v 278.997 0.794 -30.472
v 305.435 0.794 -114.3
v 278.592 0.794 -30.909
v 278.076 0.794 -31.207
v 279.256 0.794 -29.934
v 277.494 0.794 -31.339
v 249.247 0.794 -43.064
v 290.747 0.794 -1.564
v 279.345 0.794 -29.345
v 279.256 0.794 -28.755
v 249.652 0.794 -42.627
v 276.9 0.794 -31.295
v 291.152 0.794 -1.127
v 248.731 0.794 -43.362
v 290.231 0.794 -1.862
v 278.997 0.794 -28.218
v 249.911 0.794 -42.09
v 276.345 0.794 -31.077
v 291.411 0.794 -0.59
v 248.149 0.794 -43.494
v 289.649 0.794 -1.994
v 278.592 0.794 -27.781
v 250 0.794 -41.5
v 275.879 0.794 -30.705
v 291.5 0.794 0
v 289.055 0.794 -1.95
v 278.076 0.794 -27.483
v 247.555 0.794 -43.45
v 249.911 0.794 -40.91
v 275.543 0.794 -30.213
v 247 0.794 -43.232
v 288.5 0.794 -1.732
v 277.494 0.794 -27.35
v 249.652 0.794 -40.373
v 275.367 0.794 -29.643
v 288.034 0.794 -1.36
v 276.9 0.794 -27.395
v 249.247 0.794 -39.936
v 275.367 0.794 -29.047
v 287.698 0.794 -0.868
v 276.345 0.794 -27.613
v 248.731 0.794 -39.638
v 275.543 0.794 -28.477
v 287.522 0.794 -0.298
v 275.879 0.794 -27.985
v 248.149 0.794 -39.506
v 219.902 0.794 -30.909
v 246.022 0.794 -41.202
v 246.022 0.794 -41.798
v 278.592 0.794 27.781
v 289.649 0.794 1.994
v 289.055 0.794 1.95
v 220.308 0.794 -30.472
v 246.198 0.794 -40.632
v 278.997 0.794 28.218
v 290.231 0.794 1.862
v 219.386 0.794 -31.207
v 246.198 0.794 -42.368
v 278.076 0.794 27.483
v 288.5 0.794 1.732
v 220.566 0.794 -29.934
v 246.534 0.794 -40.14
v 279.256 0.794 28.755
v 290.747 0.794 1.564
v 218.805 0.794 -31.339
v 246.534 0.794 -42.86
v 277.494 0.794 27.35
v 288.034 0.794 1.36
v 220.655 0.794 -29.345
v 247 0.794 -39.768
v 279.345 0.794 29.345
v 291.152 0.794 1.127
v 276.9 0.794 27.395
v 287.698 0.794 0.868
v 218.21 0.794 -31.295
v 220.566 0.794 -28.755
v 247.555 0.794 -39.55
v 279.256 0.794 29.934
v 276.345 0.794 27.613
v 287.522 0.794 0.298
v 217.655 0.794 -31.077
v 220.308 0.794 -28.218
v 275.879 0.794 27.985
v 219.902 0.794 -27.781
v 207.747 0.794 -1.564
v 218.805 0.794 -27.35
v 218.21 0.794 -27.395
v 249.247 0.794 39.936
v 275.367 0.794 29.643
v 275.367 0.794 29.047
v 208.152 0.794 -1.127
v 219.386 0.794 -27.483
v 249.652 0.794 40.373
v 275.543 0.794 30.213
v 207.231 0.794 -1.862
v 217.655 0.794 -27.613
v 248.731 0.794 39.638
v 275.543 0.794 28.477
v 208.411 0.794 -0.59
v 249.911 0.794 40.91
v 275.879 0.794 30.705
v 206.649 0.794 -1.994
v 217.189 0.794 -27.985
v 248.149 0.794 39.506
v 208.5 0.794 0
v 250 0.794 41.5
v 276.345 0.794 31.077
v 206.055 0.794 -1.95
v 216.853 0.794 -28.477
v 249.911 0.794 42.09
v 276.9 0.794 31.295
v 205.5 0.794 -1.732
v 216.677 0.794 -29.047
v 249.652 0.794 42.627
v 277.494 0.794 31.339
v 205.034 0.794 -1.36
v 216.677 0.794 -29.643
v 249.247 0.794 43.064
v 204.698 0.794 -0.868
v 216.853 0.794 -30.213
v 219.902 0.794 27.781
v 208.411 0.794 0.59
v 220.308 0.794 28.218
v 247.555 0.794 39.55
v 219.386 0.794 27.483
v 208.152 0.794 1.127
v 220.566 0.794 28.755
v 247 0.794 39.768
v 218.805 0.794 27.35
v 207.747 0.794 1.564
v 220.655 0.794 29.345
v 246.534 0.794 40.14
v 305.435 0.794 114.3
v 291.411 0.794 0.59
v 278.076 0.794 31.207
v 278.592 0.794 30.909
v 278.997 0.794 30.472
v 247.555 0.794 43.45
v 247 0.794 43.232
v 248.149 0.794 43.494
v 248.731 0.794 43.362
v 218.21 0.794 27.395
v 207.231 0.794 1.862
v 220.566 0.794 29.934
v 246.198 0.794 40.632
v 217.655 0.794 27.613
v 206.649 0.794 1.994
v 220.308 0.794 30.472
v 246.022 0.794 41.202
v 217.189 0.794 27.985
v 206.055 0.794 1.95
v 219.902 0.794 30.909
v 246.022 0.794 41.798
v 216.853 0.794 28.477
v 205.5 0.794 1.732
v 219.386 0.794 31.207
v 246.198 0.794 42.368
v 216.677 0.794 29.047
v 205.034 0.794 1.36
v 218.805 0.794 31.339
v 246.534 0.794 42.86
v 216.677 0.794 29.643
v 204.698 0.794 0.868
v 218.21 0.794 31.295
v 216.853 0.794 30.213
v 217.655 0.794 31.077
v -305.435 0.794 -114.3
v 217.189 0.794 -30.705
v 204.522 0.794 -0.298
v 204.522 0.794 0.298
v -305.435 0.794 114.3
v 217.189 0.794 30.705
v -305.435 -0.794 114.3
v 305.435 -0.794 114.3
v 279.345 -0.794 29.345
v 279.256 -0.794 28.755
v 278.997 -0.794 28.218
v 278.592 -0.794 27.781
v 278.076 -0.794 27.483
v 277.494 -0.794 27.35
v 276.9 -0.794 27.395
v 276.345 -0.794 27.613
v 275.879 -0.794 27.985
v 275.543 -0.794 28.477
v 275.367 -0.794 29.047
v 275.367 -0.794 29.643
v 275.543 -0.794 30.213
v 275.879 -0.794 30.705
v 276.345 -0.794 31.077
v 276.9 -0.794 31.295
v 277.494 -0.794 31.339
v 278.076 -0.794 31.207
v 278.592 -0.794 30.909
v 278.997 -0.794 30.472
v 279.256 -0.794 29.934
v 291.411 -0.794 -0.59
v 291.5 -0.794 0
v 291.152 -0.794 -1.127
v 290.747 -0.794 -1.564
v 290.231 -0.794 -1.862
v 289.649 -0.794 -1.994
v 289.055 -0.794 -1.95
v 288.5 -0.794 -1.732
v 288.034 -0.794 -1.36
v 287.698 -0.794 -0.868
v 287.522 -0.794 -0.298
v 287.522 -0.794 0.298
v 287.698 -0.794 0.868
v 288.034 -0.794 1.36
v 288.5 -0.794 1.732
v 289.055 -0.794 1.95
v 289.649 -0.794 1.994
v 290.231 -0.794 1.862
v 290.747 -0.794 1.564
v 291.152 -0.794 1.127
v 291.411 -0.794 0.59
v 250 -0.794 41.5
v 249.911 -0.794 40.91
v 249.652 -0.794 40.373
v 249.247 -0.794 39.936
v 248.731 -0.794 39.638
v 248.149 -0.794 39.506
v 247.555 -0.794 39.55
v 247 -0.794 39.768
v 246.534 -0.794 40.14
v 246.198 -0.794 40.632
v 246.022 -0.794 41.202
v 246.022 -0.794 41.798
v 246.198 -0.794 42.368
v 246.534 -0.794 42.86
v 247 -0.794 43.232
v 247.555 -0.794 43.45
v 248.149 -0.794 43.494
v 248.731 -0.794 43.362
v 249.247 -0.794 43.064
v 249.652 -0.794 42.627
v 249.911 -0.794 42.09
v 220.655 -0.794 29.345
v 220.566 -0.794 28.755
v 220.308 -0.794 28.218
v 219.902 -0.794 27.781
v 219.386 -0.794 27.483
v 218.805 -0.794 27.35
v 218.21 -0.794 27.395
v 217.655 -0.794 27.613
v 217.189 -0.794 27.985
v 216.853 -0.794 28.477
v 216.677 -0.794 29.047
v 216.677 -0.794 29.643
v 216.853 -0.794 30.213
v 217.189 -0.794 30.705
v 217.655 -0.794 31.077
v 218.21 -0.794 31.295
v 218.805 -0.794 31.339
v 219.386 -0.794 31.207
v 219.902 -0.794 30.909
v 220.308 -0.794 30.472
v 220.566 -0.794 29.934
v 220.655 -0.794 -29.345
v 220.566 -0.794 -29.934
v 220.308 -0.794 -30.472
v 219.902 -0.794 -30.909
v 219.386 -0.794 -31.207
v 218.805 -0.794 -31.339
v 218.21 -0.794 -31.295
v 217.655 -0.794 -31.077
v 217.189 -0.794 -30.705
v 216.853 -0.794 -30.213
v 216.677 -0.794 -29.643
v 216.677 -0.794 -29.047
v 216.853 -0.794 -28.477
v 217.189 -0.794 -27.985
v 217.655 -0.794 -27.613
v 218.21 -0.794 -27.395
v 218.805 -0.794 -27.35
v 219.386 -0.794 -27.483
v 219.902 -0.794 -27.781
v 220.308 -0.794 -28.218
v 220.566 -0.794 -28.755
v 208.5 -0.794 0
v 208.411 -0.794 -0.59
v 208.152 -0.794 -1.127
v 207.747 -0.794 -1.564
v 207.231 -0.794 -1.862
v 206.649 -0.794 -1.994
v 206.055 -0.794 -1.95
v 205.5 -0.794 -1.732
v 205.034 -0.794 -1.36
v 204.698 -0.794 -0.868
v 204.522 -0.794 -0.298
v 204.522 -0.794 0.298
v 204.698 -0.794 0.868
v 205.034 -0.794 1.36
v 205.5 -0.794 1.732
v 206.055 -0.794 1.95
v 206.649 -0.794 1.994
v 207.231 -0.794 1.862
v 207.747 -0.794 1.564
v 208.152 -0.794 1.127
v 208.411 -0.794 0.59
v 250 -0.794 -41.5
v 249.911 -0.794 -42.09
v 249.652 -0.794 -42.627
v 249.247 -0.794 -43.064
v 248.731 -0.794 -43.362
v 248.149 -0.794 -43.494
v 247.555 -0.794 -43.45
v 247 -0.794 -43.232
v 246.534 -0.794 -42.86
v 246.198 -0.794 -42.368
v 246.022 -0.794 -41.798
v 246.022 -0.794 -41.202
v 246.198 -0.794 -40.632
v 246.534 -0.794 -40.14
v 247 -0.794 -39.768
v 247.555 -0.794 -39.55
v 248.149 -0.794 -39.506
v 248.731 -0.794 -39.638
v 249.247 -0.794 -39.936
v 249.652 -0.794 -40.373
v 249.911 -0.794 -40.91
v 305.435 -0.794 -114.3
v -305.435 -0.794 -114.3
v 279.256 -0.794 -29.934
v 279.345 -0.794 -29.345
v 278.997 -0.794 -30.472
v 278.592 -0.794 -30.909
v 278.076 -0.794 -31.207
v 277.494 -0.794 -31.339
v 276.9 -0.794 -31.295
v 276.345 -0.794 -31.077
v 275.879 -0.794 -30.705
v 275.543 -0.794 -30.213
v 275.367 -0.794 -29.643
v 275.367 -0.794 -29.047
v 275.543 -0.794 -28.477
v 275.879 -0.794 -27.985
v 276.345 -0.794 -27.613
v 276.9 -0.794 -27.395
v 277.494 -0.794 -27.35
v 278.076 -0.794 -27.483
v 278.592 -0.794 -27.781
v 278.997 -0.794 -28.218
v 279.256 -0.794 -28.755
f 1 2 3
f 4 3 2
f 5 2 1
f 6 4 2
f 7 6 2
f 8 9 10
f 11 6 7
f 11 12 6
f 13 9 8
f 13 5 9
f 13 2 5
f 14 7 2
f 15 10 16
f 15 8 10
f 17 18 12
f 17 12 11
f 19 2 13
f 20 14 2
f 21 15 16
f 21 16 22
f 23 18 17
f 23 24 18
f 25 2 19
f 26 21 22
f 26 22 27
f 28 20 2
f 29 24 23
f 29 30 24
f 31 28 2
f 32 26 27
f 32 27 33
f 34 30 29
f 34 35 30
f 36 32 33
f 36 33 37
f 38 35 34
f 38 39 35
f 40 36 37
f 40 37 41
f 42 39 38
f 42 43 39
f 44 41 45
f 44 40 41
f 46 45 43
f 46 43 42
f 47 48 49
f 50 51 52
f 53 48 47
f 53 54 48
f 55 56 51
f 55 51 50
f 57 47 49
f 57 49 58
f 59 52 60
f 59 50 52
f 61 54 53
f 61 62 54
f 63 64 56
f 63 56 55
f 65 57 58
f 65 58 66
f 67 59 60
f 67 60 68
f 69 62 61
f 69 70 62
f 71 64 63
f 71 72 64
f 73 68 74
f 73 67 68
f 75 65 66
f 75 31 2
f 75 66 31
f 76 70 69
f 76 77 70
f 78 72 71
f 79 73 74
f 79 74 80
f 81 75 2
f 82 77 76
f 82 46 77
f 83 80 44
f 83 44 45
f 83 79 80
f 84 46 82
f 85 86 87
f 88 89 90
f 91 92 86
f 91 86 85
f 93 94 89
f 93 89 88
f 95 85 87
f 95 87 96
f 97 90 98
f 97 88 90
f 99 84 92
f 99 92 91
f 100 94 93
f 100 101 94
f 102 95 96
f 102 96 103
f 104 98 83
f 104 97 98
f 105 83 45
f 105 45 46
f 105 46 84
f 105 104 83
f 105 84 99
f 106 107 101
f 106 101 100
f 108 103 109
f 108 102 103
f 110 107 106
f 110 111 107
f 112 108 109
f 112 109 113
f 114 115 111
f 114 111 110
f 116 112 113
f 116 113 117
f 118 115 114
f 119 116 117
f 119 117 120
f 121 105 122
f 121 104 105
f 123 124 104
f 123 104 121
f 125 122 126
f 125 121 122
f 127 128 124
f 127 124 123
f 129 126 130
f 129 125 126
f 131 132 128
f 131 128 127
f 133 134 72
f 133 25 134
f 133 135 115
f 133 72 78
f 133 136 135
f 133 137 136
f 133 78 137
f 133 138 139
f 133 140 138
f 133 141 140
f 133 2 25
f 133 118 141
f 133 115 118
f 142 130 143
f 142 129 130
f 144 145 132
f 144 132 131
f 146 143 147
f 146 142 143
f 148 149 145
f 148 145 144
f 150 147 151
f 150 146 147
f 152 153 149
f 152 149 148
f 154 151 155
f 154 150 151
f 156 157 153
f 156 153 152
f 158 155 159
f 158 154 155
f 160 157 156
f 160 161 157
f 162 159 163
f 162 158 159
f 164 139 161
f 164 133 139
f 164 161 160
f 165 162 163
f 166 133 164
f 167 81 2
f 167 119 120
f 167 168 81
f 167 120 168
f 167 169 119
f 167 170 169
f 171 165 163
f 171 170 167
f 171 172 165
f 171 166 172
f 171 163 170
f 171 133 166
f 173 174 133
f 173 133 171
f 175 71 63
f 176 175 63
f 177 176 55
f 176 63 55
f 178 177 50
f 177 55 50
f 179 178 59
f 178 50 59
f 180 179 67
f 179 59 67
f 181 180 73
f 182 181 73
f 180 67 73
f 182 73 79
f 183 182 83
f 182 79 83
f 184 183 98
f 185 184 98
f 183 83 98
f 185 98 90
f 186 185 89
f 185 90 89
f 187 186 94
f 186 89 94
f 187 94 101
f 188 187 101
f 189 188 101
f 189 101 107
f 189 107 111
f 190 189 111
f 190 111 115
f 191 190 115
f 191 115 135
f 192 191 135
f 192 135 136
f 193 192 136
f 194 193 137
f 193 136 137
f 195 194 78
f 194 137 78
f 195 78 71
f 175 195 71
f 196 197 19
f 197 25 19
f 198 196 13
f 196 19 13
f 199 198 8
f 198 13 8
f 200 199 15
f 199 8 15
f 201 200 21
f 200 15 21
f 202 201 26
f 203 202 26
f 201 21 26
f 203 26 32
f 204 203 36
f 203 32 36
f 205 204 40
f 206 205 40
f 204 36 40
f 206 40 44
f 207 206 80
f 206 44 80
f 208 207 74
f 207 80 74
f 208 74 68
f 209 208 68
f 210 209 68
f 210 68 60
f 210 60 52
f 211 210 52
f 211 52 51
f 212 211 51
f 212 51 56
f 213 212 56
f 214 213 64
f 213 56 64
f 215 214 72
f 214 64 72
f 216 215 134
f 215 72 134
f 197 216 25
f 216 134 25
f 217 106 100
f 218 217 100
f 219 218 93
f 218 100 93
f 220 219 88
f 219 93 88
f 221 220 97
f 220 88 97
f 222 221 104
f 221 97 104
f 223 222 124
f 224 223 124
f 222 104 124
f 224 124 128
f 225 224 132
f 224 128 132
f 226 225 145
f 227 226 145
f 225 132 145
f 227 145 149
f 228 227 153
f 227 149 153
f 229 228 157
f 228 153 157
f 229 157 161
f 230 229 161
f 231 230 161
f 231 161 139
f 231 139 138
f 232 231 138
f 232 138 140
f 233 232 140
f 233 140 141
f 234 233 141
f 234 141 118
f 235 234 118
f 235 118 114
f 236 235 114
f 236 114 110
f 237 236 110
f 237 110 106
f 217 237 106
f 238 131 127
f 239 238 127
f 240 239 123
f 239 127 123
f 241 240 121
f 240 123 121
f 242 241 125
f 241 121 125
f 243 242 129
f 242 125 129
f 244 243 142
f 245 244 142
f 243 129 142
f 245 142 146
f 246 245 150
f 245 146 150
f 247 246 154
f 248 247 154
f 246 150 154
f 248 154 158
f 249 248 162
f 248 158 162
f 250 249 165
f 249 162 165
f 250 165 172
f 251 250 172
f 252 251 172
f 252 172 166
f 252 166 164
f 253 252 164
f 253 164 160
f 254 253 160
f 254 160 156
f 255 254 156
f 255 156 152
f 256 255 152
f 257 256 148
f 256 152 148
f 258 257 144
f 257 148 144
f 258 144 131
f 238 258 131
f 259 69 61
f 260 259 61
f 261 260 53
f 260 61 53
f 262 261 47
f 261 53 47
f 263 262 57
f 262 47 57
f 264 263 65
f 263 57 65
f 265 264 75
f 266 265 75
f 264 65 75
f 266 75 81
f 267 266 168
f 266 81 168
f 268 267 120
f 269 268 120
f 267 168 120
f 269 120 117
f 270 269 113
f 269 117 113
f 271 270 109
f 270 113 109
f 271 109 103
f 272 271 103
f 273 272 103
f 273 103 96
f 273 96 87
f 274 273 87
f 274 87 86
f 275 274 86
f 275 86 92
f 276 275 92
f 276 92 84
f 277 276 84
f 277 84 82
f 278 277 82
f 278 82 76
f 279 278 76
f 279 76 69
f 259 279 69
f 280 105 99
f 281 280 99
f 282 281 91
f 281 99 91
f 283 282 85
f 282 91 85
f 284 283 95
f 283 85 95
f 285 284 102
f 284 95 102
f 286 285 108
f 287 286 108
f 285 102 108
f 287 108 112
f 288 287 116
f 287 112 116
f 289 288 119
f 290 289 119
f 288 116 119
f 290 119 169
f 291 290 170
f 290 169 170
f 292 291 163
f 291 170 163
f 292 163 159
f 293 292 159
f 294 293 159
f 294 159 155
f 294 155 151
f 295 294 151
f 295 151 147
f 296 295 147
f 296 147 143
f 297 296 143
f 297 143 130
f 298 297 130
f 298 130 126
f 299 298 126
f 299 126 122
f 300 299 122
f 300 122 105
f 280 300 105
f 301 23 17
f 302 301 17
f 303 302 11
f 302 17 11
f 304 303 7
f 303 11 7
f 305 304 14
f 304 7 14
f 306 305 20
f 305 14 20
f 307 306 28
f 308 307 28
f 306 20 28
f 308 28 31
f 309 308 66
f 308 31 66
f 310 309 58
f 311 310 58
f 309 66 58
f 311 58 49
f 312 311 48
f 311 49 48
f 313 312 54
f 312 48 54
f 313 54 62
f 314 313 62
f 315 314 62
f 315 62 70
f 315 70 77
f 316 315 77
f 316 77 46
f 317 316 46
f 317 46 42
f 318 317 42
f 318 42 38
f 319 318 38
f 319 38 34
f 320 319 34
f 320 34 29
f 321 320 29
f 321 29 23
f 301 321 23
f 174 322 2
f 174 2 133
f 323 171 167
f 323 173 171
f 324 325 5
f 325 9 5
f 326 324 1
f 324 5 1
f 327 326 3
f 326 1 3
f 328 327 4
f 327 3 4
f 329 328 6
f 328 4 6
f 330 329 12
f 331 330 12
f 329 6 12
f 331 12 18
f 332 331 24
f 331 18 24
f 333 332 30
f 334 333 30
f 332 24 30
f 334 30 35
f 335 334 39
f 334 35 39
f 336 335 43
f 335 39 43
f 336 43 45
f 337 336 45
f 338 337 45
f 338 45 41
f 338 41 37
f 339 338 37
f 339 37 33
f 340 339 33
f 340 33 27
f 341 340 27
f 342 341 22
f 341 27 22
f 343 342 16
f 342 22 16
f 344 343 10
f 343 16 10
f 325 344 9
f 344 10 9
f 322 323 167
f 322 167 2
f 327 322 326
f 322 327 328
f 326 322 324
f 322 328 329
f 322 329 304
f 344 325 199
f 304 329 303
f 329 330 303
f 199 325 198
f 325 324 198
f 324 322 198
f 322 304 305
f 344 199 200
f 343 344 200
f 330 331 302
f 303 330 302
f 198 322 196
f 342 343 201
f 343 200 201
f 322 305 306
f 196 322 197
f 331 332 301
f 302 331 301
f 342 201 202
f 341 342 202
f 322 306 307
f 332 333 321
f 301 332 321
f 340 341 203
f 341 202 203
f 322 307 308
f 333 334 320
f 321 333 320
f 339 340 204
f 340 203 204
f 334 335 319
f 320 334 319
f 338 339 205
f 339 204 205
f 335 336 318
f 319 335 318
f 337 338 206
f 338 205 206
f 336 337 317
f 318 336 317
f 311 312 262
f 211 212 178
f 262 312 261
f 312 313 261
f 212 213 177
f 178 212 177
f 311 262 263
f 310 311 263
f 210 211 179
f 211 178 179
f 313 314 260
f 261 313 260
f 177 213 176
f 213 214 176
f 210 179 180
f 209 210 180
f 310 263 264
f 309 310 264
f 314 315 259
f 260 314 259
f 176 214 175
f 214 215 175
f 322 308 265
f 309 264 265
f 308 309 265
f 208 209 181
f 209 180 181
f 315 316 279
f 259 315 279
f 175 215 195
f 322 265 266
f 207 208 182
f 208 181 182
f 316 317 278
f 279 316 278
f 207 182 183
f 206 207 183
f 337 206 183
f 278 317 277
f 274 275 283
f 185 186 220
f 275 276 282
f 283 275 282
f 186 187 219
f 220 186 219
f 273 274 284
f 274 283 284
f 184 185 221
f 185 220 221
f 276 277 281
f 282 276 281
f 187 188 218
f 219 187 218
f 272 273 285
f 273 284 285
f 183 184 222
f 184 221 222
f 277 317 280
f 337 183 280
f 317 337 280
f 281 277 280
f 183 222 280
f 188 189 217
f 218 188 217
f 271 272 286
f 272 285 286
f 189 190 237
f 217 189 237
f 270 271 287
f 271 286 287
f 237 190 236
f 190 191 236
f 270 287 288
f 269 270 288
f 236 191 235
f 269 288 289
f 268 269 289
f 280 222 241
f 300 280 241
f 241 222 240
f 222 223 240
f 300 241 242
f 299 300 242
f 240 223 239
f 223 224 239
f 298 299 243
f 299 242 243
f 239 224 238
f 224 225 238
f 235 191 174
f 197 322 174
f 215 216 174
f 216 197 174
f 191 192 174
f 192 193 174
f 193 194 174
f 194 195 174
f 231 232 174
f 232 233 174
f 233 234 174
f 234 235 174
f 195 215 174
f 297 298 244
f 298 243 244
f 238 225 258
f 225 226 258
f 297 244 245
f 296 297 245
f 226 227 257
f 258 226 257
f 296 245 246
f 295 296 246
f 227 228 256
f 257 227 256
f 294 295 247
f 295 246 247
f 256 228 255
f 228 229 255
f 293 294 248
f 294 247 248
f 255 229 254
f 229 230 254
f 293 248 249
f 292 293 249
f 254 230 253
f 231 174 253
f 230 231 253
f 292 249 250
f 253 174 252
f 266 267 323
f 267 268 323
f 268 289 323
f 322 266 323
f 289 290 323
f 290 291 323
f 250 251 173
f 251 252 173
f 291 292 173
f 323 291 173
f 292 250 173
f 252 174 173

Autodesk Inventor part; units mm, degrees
ref_plane "YZ Plane" through (0, 0, 0) normal (1, 0, 0) x (0, 1, 0)
ref_plane "XZ Plane" through (0, 0, 0) normal (0, 1, 0) x (-1, 0, 0)
ref_plane "XY Plane" through (0, 0, 0) normal (0, 0, 1) x (1, 0, 0)
sketch "Sketch1" plane through (0, 0, 0) normal (0, 1, 0) x (-1, 0, 0)
  line L0 (-305.435, 114.3) -> (305.435, 114.3)
  line L1 (305.435, 114.3) -> (305.435, -114.3)
  line L2 (305.435, -114.3) -> (-305.435, -114.3)
  line L3 (-305.435, -114.3) -> (-305.435, 114.3)
  line L4 (-305.435, 114.3) -> (305.435, -114.3) construction
  line L5 (305.435, 114.3) -> (-305.435, -114.3) construction
  point P0 (0, 0)
  dimension "d0" = 610.87
  dimension "d1" = 228.6
extrude "Extrusion1" add sketch "Sketch1" along normal mid plane 1.5875
sketch "Sketch2" plane through (0, 0.7937, 0) normal (0, 1, 0) x (1, 0, 0)
  circle A0 centre (248, 0) radius 41.5 construction
  circle A1 centre (248, 41.5) radius 2
  circle A2 centre (218.6551, 29.3449) radius 2
  circle A3 centre (206.5, 0) radius 2
  circle A4 centre (218.6551, -29.3449) radius 2
  circle A5 centre (248, -41.5) radius 2
  circle A6 centre (277.3449, -29.3449) radius 2
  circle A7 centre (289.5, 0) radius 2
  circle A8 centre (277.3449, 29.3449) radius 2
  point P0 (0, 0)
  dimension "d4" = 83
  dimension "d5" = 248
  dimension "d6" = 4
  dimension "d9" = 360
extrude "Extrusion2" cut sketch "Sketch2" against normal up to surface (1.5875 mm away)
properties part number "ChassisTop V3"
